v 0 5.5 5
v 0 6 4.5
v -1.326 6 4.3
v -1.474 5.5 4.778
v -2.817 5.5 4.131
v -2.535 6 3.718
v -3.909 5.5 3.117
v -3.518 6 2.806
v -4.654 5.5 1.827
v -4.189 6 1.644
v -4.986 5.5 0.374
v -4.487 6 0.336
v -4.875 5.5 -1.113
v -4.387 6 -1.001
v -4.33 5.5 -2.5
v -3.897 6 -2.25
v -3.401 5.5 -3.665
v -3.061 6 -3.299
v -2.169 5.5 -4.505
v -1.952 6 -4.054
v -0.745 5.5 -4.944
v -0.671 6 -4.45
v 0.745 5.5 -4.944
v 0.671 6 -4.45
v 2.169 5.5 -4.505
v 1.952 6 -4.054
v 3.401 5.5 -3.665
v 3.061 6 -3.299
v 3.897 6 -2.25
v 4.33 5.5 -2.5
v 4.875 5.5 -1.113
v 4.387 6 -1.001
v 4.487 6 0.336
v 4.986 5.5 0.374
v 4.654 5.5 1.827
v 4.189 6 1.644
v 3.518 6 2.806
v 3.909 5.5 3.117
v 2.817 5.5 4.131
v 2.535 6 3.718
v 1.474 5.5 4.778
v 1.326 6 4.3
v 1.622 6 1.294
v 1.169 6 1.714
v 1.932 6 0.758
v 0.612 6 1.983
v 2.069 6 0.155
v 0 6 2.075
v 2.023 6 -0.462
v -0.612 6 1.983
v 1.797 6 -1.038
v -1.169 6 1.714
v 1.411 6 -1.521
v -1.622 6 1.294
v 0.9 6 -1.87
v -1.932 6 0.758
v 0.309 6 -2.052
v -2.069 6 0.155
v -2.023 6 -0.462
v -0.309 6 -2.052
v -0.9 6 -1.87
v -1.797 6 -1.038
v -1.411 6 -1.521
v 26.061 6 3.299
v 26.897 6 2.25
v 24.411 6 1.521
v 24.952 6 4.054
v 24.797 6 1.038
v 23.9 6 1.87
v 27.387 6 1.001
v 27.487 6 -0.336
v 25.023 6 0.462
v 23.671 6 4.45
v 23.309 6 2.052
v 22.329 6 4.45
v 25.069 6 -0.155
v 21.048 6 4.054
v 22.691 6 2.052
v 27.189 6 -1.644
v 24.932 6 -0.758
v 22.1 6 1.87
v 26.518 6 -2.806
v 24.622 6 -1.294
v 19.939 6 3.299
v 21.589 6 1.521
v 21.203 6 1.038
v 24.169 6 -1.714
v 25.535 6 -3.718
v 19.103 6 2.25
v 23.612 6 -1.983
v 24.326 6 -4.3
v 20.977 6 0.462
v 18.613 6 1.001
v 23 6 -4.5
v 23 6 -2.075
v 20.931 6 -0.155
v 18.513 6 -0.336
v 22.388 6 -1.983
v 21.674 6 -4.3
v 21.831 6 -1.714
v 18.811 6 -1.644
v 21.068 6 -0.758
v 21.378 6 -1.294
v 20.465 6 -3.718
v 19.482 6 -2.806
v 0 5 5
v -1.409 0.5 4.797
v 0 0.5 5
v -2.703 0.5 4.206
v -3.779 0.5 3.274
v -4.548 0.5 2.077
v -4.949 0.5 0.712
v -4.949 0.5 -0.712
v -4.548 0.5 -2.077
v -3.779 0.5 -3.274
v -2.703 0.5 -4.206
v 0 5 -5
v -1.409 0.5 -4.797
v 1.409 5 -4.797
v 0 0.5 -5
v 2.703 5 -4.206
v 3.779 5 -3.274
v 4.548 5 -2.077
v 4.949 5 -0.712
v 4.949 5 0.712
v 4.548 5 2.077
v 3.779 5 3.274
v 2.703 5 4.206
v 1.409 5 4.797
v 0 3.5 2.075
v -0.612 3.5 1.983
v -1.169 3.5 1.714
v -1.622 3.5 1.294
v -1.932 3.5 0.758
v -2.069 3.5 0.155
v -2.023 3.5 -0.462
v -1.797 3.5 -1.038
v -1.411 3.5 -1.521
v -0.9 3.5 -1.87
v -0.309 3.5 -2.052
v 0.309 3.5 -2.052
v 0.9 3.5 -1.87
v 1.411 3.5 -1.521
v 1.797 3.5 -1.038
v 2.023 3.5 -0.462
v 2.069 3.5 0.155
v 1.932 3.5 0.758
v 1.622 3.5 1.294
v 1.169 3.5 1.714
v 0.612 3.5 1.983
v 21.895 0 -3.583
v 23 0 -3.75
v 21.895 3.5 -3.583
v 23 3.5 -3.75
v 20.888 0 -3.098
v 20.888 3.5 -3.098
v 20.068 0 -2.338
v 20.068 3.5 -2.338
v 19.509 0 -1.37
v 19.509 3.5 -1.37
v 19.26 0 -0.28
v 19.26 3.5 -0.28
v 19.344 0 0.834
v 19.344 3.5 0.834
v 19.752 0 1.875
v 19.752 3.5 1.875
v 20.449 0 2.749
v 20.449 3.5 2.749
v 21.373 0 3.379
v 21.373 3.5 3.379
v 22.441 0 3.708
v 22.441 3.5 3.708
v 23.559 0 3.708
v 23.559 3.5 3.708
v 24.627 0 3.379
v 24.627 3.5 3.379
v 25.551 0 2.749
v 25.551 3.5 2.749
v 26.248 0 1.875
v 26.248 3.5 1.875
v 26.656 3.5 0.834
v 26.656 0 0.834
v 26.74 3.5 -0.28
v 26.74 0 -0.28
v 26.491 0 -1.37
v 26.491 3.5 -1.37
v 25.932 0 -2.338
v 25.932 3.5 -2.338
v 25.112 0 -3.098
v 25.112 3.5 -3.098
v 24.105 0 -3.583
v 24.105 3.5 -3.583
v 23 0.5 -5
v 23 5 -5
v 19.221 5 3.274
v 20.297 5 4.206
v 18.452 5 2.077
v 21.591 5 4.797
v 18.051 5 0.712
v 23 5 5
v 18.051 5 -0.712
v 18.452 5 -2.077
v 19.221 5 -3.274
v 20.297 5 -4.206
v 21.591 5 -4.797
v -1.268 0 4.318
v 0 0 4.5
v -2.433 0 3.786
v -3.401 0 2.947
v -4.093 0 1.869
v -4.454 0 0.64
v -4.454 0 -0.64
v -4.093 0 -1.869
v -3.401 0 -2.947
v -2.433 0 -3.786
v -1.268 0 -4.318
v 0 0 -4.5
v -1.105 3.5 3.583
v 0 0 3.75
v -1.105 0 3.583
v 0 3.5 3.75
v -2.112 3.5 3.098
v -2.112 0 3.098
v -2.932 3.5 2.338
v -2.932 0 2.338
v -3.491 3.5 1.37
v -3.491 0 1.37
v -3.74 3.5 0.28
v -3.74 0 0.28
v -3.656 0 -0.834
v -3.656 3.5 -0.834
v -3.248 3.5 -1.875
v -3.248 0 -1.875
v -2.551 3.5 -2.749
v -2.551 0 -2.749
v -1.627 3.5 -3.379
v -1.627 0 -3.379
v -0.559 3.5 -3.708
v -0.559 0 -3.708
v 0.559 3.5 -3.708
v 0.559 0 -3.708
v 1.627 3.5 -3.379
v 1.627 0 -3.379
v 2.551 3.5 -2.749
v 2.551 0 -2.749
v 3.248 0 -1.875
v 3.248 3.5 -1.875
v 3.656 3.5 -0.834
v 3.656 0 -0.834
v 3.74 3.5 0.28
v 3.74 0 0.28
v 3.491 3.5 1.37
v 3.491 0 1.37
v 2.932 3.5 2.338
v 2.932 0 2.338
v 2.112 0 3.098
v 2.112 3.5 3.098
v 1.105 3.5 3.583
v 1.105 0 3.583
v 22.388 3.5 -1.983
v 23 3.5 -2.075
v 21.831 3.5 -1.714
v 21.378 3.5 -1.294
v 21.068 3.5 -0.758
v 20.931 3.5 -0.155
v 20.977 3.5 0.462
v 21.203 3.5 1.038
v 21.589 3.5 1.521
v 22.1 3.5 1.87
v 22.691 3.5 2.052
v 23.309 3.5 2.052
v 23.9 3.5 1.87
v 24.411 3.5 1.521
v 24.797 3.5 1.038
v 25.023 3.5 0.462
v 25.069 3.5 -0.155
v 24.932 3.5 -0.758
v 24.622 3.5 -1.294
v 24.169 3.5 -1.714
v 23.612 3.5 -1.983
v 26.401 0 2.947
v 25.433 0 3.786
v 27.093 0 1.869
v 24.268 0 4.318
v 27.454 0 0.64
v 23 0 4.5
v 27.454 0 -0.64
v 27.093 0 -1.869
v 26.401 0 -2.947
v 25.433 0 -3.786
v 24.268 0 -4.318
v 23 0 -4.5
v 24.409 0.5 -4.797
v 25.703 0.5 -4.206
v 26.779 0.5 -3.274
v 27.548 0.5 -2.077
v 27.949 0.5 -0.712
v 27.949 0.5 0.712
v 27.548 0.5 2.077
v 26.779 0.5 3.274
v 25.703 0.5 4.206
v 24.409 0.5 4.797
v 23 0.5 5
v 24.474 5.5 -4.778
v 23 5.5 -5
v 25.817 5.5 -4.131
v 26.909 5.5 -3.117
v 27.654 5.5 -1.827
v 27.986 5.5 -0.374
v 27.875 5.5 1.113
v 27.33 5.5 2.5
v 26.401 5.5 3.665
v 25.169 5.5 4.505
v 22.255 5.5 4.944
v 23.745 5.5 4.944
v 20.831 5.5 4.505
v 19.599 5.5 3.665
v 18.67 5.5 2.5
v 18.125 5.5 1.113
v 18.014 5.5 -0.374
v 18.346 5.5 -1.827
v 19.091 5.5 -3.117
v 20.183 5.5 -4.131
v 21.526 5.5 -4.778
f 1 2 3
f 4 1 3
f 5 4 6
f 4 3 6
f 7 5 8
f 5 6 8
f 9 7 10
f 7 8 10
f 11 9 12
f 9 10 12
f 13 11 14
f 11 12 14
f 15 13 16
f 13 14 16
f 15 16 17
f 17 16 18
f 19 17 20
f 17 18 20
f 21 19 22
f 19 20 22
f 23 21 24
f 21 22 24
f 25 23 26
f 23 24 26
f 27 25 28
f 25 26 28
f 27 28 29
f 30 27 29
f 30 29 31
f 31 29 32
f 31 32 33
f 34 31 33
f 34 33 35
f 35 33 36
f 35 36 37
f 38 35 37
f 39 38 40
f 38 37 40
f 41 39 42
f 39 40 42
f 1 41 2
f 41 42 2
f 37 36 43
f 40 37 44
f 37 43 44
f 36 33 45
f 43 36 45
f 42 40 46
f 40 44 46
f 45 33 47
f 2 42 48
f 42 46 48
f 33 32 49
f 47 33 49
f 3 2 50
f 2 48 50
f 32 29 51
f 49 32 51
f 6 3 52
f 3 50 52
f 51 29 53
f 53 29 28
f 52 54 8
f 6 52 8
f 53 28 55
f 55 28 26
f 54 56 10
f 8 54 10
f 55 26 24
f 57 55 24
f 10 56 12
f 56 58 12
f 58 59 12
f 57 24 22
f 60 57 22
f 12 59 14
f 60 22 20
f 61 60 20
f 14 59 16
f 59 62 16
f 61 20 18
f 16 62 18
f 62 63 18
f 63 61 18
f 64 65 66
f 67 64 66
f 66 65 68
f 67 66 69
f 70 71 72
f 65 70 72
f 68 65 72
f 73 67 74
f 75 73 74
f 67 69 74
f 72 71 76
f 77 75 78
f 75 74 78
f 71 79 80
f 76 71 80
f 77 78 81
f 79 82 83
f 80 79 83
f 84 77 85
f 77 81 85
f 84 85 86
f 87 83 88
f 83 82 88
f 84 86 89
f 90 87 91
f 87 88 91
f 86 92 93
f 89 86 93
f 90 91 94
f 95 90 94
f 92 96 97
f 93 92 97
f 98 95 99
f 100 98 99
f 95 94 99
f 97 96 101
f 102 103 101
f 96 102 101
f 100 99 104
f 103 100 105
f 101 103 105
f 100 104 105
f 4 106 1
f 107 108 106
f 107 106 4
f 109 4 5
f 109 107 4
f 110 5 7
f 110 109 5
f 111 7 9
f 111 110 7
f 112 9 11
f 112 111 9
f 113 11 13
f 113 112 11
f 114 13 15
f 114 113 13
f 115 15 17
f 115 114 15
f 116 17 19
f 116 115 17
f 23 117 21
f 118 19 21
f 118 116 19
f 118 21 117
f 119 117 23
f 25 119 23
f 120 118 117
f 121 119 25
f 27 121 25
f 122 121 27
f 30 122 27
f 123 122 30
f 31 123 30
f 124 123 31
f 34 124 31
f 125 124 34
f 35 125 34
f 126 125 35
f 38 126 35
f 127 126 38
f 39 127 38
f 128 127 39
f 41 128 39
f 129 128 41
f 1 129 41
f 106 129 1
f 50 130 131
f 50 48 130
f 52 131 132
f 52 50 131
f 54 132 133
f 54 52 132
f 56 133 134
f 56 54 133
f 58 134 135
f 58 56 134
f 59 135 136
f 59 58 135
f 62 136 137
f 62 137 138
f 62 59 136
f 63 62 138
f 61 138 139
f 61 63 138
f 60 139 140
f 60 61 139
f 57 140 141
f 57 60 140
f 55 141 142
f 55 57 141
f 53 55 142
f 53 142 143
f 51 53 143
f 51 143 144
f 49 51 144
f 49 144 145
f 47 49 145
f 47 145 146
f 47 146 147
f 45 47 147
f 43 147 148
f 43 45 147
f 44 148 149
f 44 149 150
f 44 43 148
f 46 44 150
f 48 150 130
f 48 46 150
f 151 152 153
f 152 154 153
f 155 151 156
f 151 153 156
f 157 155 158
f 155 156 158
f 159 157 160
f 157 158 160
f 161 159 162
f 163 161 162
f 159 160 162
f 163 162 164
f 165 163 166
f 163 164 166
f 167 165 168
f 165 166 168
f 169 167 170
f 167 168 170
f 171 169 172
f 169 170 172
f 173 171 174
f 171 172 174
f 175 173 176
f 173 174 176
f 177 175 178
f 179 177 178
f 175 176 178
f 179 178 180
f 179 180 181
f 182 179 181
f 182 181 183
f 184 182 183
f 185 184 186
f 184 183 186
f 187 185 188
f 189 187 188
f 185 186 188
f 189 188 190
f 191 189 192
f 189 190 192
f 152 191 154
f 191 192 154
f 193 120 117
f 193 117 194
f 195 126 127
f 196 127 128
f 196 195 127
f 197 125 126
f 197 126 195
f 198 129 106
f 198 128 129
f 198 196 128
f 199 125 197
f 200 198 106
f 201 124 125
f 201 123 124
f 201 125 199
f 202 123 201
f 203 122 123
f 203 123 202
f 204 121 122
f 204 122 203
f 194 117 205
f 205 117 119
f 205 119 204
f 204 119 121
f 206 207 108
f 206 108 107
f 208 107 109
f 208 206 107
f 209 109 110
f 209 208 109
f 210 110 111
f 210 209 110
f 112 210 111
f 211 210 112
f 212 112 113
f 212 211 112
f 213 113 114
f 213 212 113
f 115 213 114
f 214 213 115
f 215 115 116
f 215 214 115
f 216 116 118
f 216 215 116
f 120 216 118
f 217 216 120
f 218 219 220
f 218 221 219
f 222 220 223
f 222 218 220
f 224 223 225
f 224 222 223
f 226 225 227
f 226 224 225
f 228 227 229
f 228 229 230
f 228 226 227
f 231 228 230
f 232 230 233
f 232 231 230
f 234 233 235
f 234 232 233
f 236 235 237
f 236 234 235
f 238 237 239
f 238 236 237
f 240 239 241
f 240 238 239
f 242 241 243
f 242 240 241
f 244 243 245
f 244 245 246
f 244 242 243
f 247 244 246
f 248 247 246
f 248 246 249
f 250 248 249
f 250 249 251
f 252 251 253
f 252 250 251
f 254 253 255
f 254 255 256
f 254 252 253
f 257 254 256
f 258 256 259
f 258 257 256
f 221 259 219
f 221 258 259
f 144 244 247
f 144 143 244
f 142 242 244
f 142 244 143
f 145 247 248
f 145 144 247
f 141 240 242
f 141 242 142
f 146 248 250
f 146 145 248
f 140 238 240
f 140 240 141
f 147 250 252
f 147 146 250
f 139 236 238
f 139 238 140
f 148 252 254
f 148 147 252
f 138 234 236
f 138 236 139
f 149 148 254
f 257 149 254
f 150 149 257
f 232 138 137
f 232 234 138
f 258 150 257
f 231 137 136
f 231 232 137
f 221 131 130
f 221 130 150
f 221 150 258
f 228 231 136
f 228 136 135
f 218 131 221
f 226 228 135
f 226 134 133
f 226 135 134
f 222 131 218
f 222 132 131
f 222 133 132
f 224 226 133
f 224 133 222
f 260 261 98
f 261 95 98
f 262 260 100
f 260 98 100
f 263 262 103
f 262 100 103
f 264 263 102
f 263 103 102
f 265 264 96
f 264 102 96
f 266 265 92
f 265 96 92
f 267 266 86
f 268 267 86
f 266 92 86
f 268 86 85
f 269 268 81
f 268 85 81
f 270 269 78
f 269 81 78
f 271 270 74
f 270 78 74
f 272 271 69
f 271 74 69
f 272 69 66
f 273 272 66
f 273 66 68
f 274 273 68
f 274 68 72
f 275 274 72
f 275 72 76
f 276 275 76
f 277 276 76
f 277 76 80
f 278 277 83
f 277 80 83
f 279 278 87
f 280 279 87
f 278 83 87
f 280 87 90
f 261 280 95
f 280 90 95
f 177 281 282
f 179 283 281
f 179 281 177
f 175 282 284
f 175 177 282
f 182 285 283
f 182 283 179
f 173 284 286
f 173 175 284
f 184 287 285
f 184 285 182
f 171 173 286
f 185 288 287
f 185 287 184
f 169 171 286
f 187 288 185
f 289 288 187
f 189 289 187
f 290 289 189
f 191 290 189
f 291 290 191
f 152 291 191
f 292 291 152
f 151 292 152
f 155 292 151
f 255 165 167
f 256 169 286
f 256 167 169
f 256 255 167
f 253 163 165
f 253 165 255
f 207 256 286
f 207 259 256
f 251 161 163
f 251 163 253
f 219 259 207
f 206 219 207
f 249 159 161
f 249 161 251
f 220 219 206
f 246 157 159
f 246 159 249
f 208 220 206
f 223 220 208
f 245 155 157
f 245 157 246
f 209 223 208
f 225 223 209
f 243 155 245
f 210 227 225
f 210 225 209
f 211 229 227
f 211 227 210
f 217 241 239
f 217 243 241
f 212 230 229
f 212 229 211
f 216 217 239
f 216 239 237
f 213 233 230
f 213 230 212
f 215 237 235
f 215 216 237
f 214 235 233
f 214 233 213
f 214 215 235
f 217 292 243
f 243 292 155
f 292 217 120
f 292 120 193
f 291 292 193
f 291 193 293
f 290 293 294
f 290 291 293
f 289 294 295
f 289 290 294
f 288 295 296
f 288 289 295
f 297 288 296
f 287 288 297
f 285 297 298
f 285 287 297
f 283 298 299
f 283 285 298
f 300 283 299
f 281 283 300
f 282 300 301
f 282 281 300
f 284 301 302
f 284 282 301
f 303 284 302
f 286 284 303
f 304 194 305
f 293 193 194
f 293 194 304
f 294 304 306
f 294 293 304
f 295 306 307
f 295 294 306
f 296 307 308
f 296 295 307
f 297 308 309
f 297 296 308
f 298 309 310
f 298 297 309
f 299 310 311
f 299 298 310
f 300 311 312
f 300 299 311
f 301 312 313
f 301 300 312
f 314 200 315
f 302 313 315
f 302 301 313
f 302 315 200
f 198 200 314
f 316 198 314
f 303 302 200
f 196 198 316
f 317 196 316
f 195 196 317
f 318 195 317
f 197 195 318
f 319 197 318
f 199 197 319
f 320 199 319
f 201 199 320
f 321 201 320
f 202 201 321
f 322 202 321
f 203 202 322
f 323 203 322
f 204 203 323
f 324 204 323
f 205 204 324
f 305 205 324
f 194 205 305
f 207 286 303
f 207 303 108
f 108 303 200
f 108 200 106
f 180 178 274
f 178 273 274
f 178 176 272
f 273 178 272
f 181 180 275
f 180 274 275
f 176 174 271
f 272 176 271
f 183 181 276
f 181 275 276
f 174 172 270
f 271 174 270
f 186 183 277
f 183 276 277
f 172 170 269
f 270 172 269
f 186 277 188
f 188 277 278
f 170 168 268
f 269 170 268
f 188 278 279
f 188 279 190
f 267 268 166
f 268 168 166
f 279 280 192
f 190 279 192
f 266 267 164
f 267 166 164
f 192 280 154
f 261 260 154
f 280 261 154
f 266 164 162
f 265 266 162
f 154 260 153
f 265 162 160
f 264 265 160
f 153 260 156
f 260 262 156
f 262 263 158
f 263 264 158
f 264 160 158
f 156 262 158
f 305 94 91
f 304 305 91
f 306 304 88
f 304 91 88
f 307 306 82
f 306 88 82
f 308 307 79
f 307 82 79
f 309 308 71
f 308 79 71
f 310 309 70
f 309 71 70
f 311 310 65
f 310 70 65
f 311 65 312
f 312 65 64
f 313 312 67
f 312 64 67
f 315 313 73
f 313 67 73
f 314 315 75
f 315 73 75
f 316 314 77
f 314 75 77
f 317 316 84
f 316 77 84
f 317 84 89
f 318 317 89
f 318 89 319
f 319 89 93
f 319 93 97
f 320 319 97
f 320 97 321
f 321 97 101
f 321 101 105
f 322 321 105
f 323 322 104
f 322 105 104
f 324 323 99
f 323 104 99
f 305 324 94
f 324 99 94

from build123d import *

# Parameters (mm, degrees)
EXTRUDE_1_DEPTH     = 6
CUT_EXTRUDE_START   = -1
SKETCH_4_W          = 37.365757144
SKETCH_4_H          = 18.186872946
SKETCH_4_R          = 5
CUT_EXTRUDE_1_DEPTH = 1
CHAMFER_1_SIZE      = 0.5


with BuildPart() as part:
    # 草图1 → 凸台-拉伸1 (new body)
    with BuildSketch(Plane(origin=(0, 0, 0), x_dir=(1, 0, 0), z_dir=(0, 1, 0))):
        with BuildLine():
            Line((0, 5), (23, 5))
            ThreePointArc((23, 5), (28, 0), (23, -5))
            Line((23, -5), (0, -5))
            ThreePointArc((0, -5), (-5, 0), (0, 5))
        make_face()
    extrude(amount=EXTRUDE_1_DEPTH)

    # 草图2 → 切除-旋转1 (revolve, cut)
    with BuildSketch(Plane.XY, mode=Mode.PRIVATE) as cut_revolve_1_sk:
        Polygon((0, 0), (-3.75, 0), (-3.75, 3.5), (-2.075, 3.5), (-2.075, 6), (0, 6), align=None)
    revolve(cut_revolve_1_sk.sketch.rotate(Axis((0, 6, 0), (0, -1, 0)), 270), axis=Axis((0, 6, 0), (0, -1, 0)), mode=Mode.SUBTRACT)

    # 草图3 → 切除-旋转2 (revolve, cut)
    with BuildSketch(Plane.XY, mode=Mode.PRIVATE) as cut_revolve_2_sk:
        Polygon((23, 0), (19.25, 0), (19.25, 3.5), (20.925, 3.5), (20.925, 6), (23, 6), align=None)
    revolve(cut_revolve_2_sk.sketch.rotate(Axis((23, 0, 0), (0, 1, 0)), 270), axis=Axis((23, 0, 0), (0, 1, 0)), mode=Mode.SUBTRACT)

    # 草图4 → 切除-拉伸1 (cut)
    with BuildSketch(Plane(origin=(0, 6, 0), x_dir=(1, 0, 0), z_dir=(0, 1, 0)).offset(CUT_EXTRUDE_START)):
        with Locations((11.904152732, 0.202076366)):
            Rectangle(SKETCH_4_W, SKETCH_4_H)
        with Locations(Location((0, 0, 0), (0, 0, 270))):
            Circle(SKETCH_4_R, mode=Mode.SUBTRACT)
        with Locations(Location((23, 0, 0), (0, 0, 270))):
            Circle(SKETCH_4_R, mode=Mode.SUBTRACT)
    extrude(amount=CUT_EXTRUDE_1_DEPTH, mode=Mode.SUBTRACT)

    # 倒角1
    chamfer_1_edges = [part.edges().sort_by_distance(p)[0] for p in [
        (23, 6, 5),
        (0, 6, -5),
        (11.5, 0, -5),
        (28, 0, 0),
        (11.5, 0, 5),
        (-5, 0, 0),
    ]]
    chamfer(chamfer_1_edges, length=CHAMFER_1_SIZE)


solid = part.part
